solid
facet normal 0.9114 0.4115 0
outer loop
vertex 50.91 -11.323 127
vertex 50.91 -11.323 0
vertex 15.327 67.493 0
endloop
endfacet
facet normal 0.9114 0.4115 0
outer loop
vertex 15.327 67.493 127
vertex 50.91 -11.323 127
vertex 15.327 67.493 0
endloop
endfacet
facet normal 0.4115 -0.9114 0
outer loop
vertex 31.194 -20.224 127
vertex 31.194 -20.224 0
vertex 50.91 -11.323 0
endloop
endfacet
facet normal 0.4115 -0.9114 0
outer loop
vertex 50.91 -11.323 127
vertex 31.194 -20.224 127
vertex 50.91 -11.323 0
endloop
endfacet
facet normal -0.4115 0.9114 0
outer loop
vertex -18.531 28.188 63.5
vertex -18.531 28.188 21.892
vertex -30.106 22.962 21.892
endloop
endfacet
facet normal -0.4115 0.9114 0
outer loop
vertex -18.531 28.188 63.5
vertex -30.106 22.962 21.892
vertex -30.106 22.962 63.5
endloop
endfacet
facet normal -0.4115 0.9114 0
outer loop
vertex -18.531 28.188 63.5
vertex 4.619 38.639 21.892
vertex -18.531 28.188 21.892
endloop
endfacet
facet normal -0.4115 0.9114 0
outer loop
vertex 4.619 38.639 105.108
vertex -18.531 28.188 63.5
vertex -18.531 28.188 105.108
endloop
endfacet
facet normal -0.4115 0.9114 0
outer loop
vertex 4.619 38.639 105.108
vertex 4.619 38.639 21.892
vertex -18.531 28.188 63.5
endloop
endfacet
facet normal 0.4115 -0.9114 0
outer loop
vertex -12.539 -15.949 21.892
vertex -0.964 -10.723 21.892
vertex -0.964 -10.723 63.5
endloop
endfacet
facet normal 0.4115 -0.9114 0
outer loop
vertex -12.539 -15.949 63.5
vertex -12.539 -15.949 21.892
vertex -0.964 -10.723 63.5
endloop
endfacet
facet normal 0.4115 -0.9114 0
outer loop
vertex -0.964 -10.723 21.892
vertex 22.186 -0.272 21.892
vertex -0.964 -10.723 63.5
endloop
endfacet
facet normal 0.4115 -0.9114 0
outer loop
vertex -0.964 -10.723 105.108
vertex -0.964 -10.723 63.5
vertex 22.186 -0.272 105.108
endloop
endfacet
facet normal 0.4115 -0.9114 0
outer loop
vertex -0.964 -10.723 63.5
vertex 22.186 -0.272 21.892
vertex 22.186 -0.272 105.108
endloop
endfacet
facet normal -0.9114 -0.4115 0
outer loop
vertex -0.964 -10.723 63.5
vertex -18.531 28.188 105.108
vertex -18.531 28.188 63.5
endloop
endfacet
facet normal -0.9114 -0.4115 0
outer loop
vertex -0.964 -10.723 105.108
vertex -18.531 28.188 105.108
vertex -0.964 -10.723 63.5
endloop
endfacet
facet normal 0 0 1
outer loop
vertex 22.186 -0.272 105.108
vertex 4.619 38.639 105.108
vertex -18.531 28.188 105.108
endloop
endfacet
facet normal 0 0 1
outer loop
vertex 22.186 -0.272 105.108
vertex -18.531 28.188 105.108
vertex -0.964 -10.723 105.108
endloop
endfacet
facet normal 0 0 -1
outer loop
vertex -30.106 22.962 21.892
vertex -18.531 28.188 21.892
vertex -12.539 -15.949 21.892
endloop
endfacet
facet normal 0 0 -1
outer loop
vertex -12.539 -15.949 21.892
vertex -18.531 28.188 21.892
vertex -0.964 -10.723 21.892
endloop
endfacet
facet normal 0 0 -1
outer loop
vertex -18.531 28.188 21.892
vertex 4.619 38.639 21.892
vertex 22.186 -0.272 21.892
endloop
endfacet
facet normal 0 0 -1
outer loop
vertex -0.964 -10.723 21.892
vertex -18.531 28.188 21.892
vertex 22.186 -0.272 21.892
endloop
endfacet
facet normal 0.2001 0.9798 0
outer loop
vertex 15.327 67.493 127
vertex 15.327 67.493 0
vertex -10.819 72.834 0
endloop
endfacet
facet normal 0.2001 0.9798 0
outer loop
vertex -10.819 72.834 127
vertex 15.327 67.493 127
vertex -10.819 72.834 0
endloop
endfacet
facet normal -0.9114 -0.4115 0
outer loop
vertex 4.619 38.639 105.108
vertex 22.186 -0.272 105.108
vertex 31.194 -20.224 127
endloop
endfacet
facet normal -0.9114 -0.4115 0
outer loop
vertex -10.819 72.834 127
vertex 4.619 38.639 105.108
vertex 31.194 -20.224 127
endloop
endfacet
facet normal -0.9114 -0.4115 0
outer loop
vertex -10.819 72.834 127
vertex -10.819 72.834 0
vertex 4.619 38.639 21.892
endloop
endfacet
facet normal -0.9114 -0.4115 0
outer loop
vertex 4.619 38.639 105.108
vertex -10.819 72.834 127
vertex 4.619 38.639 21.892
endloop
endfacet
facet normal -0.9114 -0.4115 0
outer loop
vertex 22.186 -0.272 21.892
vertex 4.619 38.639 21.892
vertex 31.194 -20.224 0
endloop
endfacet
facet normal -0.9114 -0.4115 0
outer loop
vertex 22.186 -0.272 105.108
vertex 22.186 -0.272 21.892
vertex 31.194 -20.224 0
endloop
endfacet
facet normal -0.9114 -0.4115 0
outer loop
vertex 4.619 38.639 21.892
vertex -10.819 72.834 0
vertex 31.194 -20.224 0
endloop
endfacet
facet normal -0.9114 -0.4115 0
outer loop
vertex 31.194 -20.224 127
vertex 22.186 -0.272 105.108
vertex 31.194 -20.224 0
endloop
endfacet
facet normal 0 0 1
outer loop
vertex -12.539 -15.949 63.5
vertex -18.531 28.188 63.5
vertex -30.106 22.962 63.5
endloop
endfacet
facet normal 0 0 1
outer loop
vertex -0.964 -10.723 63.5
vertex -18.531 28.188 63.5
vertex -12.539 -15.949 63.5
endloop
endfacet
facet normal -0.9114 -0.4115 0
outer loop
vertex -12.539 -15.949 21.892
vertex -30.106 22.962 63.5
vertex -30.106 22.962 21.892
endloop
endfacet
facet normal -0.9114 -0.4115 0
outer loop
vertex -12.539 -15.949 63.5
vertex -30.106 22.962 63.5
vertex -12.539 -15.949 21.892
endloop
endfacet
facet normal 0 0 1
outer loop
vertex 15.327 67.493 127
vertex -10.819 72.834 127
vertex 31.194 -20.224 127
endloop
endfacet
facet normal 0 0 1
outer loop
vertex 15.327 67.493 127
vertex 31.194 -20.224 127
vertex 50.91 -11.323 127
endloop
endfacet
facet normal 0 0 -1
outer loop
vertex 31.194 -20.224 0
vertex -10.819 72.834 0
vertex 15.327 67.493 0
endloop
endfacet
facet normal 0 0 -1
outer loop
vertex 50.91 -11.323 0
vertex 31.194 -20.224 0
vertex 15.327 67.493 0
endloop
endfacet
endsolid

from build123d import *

# Parameters (mm, degrees)
F1_DEPTH = 127
F2_W     = 42.6925110772
F2_H     = 83.2166295946
F3_DEPTH = 25.4
F4_W     = 42.6925110772
F4_H     = 41.6083147973
F5_DEPTH = 12.7


with BuildPart() as f1:
    # F0 (on Top) → F1 (new body)
    with BuildSketch(Plane.XY):
        Polygon((15.3271912833, 67.492875863), (-10.8187645674, 72.8341937065), (31.1941243708, -20.2240943909), (50.9100646707, -11.32296772), align=None)
    extrude(amount=F1_DEPTH)

    # F2 (on face) → F3 (join)
    with BuildSketch(Plane(origin=(18.3279159537, 8.2744773537, 0), x_dir=(0.4114774291, -0.9114199501, 0), z_dir=(-0.9114199501, -0.4114774291, 0))):
        with Locations((-11.9696195438, 63.5)):
            Rectangle(F2_W, F2_H)
    extrude(amount=F3_DEPTH)

    # F4 (on face) → F5 (join)
    with BuildSketch(Plane(origin=(-4.822150778, -2.1770493443, 0), x_dir=(0.4114774291, -0.9114199501, 0), z_dir=(-0.9114199501, -0.4114774291, 0))):
        with Locations((-11.9696195438, 42.6958426014)):
            Rectangle(F4_W, F4_H)
    extrude(amount=F5_DEPTH)


solid = f1.part
